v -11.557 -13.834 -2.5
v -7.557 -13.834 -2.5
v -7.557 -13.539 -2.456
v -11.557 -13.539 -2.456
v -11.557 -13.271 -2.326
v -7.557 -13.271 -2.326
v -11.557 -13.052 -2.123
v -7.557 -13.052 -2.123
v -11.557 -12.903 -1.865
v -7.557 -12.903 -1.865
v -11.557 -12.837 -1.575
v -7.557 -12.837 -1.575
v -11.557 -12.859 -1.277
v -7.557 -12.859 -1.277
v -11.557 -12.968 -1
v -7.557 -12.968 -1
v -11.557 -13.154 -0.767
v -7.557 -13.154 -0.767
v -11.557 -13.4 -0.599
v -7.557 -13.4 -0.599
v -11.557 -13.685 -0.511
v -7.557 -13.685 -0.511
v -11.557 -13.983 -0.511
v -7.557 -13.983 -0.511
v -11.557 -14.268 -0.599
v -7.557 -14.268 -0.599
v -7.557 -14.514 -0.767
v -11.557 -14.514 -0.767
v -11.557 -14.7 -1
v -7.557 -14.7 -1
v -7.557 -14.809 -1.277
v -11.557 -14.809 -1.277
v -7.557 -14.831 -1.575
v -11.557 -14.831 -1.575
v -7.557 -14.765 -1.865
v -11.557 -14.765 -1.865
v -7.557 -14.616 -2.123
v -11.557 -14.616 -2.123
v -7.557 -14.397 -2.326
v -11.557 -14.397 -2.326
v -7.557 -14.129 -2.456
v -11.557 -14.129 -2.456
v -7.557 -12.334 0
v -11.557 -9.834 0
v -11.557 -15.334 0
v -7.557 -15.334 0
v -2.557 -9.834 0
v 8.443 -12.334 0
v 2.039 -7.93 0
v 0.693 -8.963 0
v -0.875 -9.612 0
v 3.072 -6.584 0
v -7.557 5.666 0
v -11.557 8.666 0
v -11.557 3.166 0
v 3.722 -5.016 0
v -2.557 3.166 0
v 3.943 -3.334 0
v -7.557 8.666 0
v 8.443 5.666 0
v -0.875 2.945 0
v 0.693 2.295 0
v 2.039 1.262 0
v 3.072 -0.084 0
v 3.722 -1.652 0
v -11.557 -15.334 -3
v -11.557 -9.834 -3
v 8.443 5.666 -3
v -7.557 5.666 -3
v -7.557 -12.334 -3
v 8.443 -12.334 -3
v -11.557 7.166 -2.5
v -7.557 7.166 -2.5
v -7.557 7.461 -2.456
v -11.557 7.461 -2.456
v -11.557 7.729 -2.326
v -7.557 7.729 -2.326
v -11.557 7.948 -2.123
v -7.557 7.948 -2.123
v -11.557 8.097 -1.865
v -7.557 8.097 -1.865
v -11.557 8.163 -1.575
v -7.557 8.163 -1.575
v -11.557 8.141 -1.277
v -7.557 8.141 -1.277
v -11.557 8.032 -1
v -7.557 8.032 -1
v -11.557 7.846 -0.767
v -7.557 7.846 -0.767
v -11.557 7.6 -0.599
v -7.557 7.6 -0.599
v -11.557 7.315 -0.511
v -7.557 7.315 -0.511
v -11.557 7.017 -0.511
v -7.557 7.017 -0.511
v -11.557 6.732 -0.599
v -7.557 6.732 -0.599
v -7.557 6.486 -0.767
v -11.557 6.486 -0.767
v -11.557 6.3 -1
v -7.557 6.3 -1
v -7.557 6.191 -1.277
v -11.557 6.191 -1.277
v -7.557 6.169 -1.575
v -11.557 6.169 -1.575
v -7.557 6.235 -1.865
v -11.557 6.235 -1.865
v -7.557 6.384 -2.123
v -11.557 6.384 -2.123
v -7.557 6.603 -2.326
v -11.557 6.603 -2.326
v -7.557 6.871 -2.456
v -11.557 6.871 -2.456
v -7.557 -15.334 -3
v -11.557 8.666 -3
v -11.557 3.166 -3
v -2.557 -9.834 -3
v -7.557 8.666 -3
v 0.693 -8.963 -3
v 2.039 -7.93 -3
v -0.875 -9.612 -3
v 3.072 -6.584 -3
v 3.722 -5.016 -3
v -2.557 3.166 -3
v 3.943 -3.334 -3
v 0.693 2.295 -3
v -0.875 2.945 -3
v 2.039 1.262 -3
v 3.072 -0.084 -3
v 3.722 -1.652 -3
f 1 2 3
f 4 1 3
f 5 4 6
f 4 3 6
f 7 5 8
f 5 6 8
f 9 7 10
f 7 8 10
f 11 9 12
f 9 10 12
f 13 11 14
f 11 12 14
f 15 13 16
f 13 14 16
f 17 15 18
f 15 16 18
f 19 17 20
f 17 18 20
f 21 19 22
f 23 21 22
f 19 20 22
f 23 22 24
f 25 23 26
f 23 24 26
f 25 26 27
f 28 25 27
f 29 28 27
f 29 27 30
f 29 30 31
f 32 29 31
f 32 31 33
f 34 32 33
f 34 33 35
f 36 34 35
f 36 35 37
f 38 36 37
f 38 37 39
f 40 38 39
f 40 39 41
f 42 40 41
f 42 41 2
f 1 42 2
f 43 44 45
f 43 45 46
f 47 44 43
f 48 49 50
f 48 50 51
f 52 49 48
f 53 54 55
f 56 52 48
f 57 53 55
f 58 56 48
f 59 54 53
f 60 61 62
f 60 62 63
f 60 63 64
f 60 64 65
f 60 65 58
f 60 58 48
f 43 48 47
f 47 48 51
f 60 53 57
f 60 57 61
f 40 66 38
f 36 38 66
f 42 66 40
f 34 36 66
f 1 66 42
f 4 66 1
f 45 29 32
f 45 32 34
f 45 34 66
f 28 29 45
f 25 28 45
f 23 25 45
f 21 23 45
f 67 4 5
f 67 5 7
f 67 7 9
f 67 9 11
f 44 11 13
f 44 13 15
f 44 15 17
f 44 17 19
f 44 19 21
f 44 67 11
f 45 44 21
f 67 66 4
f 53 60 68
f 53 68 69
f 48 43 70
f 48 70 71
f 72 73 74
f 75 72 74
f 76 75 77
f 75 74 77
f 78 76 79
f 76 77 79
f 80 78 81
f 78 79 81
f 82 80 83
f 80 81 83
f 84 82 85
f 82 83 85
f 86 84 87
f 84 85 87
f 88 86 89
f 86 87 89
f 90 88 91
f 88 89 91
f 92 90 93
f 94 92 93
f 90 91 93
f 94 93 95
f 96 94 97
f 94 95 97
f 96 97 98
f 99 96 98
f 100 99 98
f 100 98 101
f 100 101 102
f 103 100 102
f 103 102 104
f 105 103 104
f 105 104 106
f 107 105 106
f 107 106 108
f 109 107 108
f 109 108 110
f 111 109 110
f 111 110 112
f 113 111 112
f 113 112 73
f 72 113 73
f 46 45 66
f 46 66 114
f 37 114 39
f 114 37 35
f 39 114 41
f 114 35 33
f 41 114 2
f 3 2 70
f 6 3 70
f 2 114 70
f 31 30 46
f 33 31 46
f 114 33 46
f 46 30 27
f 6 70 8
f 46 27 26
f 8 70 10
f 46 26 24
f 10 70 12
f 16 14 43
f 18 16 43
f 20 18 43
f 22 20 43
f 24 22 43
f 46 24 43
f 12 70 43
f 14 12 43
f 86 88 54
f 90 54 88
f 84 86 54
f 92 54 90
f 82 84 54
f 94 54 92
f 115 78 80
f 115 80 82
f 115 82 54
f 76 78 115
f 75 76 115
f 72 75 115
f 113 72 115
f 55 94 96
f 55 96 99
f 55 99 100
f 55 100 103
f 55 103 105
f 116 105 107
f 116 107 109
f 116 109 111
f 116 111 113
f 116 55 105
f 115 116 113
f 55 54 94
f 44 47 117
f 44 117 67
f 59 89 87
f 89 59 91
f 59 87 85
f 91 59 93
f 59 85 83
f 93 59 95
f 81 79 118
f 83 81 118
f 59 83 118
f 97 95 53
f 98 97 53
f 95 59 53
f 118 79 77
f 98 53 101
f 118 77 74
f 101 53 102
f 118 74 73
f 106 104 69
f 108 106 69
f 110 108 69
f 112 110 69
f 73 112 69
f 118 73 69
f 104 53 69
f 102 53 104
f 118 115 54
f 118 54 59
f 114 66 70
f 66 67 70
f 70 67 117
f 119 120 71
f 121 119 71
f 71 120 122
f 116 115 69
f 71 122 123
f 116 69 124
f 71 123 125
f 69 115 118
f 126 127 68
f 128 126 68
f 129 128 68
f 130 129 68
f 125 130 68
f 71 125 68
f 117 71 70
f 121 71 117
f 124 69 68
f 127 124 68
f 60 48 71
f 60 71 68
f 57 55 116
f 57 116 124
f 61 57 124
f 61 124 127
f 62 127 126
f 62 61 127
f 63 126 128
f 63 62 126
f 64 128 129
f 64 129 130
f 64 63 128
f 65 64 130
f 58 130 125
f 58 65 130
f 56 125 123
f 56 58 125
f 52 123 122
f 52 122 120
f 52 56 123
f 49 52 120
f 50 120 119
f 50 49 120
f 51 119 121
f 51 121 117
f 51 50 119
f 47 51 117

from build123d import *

# Parameters (mm, degrees)
BOSS_EXTRUDE1_DEPTH = 3
SKETCH3_W           = 4
SKETCH3_H           = 3
BOSS_EXTRUDE2_DEPTH = 3
SKETCH4_W           = 4
SKETCH4_H           = 3
BOSS_EXTRUDE3_DEPTH = 3
SKETCH5_R           = 1
CUT_EXTRUDE1_DEPTH  = 23.363531015
SKETCH6_R           = 1
CUT_EXTRUDE2_DEPTH  = 23.363531015


with BuildPart() as part:
    # Sketch2 → Boss-Extrude1 (new body)
    with BuildSketch(Plane.XY):
        with BuildLine():
            Line((-11.556982343, -12.333868379), (8.443017657, -12.333868379))
            Line((8.443017657, -12.333868379), (8.443017657, 5.666131621))
            Line((8.443017657, 5.666131621), (-11.556982343, 5.666131621))
            Line((-11.556982343, 5.666131621), (-11.556982343, 3.166131621))
            Line((-11.556982343, 3.166131621), (-2.556982343, 3.166131621))
            ThreePointArc((-2.556982343, 3.166131621), (3.943017657, -3.333868379), (-2.556982343, -9.833868379))
            Line((-2.556982343, -9.833868379), (-11.556982343, -9.833868379))
            Line((-11.556982343, -9.833868379), (-11.556982343, -12.333868379))
        make_face()
    extrude(amount=-BOSS_EXTRUDE1_DEPTH)

    # Sketch3 → Boss-Extrude2 (add)
    with BuildSketch(Plane(origin=(0, 5.666131621, 0), x_dir=(1, 0, 0), z_dir=(0, 1, 0))):
        with Locations((-9.556982343, 1.5)):
            Rectangle(SKETCH3_W, SKETCH3_H)
    extrude(amount=BOSS_EXTRUDE2_DEPTH)

    # Sketch4 → Boss-Extrude3 (add)
    with BuildSketch(Plane.XZ.offset(12.333868379)):
        with Locations((-9.556982343, -1.5)):
            Rectangle(SKETCH4_W, SKETCH4_H)
    extrude(amount=BOSS_EXTRUDE3_DEPTH)

    # Sketch5 → Cut-Extrude1 (cut, through all)
    with BuildSketch(Plane(origin=(-7.556982343, 0, 0), x_dir=(0, 0, -1), z_dir=(1, 0, 0))):
        with Locations((1.5, 7.166131621)):
            Circle(SKETCH5_R)
    extrude(amount=-CUT_EXTRUDE1_DEPTH, mode=Mode.SUBTRACT)

    # Sketch6 → Cut-Extrude2 (cut, through all)
    with BuildSketch(Plane(origin=(-7.556982343, 0, 0), x_dir=(0, 0, -1), z_dir=(1, 0, 0))):
        with Locations((1.5, -13.833868379)):
            Circle(SKETCH6_R)
    extrude(amount=-CUT_EXTRUDE2_DEPTH, mode=Mode.SUBTRACT)


solid = part.part
